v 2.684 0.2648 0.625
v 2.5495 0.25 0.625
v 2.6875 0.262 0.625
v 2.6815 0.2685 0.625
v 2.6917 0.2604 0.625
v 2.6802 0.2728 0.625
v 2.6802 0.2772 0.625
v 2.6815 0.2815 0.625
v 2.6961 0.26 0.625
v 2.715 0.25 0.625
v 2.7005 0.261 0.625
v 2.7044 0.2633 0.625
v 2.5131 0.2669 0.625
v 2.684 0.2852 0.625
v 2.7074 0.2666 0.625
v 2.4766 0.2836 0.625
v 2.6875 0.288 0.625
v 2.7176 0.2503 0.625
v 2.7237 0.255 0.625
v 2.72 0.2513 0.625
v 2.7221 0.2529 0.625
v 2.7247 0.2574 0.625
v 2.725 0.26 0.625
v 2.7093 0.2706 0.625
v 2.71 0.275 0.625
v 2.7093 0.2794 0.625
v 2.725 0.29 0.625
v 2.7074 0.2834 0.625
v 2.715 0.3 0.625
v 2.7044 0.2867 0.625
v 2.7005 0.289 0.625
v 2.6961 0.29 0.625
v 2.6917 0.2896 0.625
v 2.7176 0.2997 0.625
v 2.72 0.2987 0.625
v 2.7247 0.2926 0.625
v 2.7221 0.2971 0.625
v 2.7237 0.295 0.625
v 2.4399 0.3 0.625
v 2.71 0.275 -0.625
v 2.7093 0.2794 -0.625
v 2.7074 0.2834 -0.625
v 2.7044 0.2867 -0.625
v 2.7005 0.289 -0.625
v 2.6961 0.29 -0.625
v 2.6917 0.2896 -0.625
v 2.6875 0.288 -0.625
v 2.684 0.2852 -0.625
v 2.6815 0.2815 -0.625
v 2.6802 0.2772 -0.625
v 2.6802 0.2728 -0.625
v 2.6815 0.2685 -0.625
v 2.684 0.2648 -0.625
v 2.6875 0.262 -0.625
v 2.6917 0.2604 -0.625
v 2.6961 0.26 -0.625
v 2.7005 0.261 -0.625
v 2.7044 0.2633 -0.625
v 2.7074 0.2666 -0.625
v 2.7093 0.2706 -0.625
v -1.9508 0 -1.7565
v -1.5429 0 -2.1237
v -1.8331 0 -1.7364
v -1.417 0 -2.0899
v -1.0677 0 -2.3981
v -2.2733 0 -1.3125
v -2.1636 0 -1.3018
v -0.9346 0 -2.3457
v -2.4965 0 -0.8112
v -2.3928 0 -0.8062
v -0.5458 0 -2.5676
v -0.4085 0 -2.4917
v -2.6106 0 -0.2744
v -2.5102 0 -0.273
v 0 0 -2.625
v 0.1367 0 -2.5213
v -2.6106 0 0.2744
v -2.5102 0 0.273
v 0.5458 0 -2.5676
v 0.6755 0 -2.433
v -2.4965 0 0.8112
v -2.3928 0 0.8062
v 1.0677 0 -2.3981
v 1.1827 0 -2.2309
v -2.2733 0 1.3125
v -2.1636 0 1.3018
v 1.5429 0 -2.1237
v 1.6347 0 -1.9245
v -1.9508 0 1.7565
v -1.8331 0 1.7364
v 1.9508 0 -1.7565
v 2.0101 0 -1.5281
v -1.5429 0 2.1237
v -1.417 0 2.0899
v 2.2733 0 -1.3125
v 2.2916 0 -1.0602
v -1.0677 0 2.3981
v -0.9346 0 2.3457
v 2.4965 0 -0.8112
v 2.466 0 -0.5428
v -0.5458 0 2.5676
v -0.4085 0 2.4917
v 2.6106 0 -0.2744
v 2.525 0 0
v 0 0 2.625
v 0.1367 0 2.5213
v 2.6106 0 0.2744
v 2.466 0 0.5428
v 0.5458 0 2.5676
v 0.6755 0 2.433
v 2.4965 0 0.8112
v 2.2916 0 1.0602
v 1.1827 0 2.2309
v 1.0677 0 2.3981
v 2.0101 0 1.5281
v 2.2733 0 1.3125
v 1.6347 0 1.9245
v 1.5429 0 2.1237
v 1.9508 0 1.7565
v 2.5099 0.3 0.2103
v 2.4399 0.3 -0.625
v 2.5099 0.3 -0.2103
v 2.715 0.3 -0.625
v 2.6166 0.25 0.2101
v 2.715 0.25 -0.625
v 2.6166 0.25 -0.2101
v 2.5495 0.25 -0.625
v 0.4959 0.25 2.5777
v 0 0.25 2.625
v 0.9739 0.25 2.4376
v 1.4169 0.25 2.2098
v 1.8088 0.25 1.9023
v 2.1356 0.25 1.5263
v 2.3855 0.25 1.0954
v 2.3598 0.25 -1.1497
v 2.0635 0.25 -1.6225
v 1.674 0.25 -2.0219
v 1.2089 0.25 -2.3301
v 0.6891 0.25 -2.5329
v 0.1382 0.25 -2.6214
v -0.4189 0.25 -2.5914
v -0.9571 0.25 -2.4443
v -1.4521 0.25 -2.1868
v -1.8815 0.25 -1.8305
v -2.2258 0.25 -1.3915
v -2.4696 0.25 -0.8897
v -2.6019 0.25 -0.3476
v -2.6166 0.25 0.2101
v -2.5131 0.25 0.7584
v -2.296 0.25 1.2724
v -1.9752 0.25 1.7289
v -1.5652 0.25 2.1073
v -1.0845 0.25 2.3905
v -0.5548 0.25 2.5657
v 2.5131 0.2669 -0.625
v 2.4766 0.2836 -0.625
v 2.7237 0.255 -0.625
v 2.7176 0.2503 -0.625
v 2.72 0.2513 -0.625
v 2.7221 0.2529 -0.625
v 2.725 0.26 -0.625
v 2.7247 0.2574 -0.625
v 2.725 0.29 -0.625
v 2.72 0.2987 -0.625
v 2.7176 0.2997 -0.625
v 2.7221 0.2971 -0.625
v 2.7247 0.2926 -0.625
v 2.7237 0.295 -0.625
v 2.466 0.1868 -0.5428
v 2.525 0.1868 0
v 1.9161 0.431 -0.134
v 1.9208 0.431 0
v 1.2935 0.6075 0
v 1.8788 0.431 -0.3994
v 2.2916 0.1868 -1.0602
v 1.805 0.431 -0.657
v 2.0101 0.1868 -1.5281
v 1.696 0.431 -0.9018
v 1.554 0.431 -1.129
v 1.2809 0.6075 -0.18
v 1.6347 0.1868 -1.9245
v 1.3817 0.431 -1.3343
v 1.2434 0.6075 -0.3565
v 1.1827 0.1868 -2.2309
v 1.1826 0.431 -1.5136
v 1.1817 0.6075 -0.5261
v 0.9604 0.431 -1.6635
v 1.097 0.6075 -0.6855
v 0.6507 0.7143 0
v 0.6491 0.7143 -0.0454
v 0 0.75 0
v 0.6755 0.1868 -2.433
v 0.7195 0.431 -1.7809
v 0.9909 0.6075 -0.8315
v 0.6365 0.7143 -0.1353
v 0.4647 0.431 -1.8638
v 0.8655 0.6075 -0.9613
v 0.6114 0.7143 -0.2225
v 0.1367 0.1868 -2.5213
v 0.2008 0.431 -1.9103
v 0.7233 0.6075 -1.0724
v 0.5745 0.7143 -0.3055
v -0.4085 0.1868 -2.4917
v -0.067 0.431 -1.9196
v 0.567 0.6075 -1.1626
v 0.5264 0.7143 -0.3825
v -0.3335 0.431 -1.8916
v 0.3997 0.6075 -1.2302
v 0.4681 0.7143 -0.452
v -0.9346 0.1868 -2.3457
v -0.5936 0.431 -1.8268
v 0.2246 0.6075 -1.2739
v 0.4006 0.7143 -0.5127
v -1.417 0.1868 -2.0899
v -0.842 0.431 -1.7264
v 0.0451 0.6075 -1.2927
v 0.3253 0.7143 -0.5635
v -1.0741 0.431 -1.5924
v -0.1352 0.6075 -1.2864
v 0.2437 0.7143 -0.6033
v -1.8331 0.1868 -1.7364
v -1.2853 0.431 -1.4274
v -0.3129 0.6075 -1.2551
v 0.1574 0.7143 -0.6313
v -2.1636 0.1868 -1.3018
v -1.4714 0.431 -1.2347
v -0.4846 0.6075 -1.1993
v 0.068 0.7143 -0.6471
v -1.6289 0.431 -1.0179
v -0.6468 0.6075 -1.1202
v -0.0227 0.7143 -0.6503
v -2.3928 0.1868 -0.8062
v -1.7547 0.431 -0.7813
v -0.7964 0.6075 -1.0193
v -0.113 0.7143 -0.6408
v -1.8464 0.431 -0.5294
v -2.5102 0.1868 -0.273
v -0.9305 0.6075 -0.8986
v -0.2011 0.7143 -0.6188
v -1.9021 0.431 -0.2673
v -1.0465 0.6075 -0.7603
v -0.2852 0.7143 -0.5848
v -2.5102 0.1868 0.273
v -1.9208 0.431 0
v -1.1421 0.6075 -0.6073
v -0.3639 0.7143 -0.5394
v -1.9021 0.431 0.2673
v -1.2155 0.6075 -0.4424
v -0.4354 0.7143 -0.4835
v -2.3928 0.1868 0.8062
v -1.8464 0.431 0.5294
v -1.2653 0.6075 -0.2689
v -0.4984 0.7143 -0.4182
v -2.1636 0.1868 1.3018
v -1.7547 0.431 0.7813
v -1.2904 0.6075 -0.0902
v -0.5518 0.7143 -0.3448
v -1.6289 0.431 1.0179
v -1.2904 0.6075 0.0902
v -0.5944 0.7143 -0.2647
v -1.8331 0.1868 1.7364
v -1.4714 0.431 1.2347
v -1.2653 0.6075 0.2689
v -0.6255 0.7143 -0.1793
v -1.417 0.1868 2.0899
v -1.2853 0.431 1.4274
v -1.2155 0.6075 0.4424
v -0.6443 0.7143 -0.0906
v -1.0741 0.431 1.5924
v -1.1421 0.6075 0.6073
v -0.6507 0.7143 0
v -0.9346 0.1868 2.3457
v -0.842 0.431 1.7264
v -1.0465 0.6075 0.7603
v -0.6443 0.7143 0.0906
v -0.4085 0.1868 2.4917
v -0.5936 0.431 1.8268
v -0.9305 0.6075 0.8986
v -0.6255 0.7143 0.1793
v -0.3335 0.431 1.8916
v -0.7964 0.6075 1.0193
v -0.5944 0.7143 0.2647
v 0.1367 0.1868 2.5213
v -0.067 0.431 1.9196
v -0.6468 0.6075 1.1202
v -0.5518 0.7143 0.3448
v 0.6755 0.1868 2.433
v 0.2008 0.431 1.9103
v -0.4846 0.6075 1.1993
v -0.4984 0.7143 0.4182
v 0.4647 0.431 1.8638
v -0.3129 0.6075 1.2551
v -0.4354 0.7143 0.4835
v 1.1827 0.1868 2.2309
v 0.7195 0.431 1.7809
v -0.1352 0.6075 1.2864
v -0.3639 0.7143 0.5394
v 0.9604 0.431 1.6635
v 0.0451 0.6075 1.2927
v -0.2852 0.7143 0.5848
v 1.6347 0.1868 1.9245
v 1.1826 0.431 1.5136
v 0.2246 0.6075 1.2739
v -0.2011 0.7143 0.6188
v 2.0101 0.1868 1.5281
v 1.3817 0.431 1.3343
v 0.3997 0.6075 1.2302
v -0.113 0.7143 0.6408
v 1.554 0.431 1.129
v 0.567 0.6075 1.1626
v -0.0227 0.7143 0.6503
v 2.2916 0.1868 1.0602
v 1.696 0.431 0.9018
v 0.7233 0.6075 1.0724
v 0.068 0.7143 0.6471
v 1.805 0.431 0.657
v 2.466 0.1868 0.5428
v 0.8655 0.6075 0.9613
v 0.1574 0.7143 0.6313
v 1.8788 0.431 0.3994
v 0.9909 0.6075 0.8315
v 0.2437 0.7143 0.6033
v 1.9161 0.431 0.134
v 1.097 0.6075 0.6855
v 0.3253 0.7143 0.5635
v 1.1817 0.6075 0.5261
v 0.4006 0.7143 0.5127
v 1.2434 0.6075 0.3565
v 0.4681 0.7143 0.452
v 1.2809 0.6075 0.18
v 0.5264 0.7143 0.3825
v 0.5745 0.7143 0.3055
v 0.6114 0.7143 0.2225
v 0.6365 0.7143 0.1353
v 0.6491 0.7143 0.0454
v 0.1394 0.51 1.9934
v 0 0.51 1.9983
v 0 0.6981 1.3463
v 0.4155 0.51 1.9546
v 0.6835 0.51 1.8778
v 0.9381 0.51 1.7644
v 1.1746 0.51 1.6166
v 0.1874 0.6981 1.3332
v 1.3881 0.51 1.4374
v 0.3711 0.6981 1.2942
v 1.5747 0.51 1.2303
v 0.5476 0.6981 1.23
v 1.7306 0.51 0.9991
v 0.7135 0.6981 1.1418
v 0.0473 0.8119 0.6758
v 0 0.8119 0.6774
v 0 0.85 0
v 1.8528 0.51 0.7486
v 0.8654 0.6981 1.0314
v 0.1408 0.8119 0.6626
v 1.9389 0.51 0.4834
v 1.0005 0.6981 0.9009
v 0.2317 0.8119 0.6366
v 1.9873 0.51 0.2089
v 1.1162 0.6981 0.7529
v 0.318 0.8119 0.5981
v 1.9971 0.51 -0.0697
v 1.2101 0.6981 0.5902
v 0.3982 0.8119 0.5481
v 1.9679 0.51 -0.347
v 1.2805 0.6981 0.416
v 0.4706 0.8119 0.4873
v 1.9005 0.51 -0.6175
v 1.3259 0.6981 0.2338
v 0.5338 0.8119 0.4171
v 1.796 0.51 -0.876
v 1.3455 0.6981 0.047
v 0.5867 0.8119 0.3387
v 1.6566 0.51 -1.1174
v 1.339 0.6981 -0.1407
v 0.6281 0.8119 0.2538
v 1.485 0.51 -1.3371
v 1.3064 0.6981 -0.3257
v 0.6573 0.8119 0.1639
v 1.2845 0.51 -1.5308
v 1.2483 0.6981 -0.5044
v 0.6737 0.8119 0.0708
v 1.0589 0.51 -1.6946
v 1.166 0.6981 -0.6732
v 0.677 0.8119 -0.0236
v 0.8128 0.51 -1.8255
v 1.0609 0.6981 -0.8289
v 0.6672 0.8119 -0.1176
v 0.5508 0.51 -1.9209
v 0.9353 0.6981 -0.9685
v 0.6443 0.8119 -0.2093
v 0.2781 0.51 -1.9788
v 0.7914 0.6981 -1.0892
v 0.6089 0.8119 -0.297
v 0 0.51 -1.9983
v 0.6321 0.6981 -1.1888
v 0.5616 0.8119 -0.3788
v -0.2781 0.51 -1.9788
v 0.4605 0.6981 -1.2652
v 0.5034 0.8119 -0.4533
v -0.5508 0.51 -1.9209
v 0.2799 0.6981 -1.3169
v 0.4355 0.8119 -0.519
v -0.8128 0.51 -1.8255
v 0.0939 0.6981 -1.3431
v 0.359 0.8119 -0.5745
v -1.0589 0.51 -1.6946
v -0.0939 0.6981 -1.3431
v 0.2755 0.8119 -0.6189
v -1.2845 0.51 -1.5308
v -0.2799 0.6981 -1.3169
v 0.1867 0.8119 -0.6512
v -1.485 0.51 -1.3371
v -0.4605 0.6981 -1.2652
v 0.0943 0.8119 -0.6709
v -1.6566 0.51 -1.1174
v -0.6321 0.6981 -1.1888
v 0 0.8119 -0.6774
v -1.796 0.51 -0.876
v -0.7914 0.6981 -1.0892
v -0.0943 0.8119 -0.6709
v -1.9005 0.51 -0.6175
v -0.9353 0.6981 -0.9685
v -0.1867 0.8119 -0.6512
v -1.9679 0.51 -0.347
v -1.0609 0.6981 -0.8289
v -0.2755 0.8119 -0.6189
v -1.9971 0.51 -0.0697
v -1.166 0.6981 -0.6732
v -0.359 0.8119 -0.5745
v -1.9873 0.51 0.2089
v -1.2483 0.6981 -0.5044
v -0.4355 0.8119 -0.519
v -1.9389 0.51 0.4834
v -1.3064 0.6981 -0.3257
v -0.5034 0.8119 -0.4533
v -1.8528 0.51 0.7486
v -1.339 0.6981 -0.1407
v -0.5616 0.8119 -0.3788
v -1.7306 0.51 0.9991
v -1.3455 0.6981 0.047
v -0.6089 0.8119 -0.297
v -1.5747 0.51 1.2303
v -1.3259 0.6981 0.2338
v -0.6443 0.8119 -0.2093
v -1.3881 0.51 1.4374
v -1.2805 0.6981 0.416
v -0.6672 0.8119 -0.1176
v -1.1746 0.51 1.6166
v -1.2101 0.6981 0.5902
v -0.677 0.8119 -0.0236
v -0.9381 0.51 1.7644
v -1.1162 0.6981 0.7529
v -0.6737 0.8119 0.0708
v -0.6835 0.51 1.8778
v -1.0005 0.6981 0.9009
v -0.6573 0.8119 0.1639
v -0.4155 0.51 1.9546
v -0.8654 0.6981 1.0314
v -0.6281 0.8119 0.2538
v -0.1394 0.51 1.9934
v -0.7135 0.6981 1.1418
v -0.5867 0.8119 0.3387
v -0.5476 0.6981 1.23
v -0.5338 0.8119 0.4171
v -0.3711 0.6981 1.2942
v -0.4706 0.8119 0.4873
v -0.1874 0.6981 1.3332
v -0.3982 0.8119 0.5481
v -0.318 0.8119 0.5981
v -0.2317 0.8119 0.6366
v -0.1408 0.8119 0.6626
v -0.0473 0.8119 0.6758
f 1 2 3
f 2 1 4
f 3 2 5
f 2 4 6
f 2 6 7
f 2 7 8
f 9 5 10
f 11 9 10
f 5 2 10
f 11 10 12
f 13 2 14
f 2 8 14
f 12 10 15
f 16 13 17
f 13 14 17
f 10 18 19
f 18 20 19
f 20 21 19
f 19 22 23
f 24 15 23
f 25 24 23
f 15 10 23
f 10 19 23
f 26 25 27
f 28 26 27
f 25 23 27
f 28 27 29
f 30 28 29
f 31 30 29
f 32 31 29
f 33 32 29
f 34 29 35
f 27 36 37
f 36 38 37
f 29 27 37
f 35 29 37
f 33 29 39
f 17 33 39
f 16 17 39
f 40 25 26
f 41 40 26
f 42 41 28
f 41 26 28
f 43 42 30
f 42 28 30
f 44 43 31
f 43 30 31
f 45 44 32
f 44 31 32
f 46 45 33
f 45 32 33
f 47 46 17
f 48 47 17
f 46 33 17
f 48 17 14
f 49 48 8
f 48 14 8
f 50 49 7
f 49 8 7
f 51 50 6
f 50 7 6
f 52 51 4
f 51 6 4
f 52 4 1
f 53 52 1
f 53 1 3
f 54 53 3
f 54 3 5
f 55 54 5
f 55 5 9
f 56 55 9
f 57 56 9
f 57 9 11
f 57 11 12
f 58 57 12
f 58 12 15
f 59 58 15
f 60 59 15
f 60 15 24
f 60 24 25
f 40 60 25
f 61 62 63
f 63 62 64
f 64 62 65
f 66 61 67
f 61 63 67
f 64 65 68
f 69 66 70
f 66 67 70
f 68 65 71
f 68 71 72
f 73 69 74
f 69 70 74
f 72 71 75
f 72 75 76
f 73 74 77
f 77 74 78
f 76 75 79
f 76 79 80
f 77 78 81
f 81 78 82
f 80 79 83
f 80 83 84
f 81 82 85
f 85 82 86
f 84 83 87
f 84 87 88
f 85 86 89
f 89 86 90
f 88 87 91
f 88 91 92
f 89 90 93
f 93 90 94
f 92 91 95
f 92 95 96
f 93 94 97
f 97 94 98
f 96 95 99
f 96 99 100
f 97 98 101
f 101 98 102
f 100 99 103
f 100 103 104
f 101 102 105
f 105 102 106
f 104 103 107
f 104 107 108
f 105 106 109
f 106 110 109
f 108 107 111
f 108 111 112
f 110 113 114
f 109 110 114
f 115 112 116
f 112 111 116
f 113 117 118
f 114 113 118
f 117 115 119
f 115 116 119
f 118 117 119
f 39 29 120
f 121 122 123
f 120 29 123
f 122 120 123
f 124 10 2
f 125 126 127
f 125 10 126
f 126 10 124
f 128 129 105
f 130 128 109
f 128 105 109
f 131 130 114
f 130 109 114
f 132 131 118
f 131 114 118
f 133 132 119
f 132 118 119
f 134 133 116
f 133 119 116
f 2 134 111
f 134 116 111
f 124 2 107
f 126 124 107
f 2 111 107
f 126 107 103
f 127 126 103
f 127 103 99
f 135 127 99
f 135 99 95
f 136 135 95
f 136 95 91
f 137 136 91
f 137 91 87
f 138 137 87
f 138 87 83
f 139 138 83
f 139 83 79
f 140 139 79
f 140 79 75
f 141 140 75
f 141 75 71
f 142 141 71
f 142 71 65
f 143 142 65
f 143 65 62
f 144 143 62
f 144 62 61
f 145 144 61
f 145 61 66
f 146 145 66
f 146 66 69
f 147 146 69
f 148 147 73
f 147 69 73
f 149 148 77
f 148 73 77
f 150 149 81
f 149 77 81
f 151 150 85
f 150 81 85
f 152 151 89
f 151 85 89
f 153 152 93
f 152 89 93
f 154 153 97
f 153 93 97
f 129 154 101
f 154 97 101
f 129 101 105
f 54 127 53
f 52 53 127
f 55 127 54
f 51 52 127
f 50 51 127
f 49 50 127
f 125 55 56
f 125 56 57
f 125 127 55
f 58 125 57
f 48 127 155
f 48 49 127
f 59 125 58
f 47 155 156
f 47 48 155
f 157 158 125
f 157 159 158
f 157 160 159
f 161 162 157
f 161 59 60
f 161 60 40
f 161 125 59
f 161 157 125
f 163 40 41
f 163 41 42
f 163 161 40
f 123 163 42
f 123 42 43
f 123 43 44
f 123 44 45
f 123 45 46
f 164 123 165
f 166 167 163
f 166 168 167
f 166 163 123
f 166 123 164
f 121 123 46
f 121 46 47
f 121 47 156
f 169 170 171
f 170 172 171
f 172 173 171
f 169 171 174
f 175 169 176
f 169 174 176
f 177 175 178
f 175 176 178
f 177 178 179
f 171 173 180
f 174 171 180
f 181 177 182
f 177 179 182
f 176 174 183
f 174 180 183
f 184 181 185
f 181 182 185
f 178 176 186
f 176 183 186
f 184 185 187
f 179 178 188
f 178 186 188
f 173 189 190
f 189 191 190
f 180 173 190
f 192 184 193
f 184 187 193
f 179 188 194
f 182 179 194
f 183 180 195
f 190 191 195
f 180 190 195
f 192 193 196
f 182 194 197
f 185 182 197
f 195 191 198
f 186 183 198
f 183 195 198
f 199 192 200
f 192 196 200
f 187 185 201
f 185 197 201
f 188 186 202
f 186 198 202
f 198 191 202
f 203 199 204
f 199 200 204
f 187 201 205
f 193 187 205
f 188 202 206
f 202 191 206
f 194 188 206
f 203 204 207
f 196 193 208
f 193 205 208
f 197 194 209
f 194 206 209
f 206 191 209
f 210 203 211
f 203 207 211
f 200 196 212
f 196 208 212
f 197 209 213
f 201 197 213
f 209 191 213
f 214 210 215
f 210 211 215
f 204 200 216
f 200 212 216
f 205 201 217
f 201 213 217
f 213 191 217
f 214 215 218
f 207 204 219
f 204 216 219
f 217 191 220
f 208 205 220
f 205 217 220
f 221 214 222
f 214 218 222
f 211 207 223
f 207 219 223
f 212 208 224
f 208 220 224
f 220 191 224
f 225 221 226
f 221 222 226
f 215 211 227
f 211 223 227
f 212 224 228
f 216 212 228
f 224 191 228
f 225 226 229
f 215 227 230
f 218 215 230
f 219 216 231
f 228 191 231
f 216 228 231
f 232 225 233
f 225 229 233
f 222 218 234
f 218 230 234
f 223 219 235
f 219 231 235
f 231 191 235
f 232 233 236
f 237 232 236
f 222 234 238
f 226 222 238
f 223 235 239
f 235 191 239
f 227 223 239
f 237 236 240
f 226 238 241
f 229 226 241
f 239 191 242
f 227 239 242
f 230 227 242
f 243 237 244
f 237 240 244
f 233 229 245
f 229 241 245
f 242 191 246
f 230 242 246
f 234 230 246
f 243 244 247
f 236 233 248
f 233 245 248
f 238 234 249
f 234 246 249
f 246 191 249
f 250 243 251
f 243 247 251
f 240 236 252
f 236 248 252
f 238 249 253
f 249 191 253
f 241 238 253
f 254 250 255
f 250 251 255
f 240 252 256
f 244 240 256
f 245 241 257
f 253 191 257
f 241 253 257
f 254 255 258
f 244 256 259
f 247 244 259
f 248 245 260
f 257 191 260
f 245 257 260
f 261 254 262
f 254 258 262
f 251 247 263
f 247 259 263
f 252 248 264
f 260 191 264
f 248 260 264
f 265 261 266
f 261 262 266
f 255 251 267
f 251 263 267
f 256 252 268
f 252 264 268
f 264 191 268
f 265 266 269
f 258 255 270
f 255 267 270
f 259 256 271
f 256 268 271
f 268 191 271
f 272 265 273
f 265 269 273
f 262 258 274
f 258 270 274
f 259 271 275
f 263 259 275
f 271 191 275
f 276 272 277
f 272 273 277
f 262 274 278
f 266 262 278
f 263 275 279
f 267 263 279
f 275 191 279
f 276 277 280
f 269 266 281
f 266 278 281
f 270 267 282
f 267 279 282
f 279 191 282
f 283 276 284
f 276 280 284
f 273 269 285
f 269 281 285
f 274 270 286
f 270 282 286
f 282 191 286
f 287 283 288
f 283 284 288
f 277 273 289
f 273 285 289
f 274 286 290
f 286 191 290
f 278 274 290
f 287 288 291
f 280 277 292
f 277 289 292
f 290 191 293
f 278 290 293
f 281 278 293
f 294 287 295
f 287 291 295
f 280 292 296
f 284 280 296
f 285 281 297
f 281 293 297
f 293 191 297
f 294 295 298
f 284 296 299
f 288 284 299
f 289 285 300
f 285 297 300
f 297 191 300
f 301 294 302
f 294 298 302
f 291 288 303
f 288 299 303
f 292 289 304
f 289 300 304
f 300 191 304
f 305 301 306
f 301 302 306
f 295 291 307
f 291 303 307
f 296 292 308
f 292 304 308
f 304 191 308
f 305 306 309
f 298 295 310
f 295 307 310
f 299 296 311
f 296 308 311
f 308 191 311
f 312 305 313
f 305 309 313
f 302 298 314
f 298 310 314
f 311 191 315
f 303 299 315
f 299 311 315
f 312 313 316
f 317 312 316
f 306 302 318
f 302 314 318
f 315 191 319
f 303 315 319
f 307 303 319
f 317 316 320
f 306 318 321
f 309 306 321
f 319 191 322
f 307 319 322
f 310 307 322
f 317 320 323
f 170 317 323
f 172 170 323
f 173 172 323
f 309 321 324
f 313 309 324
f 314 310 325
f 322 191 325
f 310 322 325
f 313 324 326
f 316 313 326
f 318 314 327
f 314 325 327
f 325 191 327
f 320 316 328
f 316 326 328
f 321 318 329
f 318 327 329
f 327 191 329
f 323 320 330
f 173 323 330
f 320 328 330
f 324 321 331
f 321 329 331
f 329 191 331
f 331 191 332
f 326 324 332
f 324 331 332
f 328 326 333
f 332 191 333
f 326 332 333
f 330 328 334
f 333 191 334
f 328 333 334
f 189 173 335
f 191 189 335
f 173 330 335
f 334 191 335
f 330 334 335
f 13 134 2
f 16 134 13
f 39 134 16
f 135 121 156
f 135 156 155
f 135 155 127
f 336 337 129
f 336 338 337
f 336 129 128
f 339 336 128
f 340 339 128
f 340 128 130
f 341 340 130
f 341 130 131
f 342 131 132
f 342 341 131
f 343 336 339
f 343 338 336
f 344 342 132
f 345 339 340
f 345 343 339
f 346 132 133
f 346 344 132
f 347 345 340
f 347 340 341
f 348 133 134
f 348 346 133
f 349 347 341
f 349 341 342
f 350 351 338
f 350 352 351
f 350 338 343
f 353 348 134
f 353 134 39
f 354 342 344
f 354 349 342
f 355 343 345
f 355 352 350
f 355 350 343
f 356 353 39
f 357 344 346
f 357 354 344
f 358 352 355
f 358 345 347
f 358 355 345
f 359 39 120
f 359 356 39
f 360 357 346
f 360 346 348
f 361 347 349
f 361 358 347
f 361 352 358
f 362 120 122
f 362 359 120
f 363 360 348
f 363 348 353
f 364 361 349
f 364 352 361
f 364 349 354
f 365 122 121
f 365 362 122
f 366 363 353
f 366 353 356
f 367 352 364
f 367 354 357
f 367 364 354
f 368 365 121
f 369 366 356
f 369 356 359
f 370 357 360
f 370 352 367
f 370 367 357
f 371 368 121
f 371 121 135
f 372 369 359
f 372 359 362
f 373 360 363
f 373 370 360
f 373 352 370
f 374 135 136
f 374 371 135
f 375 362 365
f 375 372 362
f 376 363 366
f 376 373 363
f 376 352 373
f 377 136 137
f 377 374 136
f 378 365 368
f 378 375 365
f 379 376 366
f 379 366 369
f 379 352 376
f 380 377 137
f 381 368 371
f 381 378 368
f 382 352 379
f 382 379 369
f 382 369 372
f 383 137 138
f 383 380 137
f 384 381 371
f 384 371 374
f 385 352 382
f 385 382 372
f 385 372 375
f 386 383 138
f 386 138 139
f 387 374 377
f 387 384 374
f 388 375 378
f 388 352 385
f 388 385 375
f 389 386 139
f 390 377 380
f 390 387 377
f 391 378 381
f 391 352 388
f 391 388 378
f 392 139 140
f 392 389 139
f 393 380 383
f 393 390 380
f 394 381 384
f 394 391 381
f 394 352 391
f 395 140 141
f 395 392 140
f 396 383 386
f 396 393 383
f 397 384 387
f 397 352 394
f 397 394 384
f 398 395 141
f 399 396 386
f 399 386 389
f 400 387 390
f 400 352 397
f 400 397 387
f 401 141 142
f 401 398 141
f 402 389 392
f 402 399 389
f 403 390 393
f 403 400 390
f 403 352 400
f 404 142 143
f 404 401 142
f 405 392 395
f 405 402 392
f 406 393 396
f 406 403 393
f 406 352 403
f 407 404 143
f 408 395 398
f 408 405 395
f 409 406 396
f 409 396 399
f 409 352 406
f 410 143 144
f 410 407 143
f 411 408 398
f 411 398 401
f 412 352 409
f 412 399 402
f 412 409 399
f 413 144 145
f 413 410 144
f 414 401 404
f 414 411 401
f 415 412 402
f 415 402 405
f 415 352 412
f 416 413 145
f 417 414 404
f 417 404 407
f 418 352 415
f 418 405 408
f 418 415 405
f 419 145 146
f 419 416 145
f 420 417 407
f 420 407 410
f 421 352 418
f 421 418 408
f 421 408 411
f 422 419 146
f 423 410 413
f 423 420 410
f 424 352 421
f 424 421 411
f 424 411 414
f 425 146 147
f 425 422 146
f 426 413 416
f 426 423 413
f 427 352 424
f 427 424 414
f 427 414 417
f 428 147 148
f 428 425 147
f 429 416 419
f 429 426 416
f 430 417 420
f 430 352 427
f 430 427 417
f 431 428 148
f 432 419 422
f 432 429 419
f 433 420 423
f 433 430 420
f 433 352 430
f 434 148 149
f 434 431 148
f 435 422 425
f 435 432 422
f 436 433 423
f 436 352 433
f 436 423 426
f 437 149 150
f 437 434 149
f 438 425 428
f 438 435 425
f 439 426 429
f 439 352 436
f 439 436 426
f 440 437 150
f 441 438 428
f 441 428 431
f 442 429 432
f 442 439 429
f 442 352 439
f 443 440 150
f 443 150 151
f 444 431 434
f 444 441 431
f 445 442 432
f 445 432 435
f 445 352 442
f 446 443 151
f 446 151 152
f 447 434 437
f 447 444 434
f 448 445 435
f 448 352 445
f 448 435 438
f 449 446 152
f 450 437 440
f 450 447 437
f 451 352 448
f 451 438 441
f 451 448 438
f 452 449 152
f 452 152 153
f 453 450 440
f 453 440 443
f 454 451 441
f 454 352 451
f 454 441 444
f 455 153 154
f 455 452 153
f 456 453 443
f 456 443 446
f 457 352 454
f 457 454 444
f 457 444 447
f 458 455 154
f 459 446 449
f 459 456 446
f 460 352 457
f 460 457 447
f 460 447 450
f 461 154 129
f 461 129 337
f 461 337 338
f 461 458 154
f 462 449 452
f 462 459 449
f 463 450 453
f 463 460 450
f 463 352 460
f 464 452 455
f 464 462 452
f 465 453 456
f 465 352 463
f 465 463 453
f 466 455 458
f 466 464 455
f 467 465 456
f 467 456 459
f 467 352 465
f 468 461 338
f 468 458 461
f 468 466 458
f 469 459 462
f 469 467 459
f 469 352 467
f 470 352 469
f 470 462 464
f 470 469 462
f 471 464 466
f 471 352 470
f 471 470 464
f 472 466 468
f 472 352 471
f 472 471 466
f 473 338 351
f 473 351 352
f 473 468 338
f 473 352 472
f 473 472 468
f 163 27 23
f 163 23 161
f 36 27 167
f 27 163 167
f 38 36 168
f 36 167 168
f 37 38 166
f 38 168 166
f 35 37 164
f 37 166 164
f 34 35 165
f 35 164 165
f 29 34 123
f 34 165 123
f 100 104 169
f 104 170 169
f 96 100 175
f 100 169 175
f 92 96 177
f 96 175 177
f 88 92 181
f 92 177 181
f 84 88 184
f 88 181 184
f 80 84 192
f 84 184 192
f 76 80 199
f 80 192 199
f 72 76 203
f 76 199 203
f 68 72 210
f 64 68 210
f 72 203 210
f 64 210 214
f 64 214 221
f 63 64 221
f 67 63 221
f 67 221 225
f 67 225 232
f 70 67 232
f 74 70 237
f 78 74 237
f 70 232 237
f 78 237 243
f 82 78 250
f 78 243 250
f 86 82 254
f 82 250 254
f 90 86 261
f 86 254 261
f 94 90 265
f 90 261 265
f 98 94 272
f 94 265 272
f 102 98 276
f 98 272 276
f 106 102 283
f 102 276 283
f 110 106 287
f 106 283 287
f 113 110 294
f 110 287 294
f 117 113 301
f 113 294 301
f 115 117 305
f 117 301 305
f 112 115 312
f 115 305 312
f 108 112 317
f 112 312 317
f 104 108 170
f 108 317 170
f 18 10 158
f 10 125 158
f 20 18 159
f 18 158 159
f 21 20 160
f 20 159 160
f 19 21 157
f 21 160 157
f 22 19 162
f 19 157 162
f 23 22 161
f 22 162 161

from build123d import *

# Parameters (mm, degrees)
SKETCH1_R                       = 2.625
BOSS_EXTRUDE1_DEPTH             = 0.25
DOME1_FACE_RADIUS               = 2.625
DOME1_HEIGHT                    = 0.6
SKETCH2_W                       = 1.25
SKETCH2_H                       = 0.05
BOSS_EXTRUDE2_DEPTH             = 0.1
BOSS_EXTRUDE2_DIRECTION_2_REACH = 7.931
FILLET1_R                       = 0.01
CUT_EXTRUDE1_REACH              = 6.326
SKETCH3_R                       = 0.015


# Read off the part's stored shape, not the designer's step: Shell1
with BuildPart() as part:
    # Sketch1 → Boss-Extrude1 (new body)
    with BuildSketch(Plane(origin=(0, 0, 0), x_dir=(1, 0, 0), z_dir=(0, 1, 0))):
        with Locations(Location((0, 0, 0), (0, 0, 270))):
            Circle(SKETCH1_R)
    extrude(amount=BOSS_EXTRUDE1_DEPTH)

    # Dome1: a dome of height H over a round flat face of radius A is a cap of a sphere of radius (A * A + H * H) / (2 * H)
    dome1_r = (DOME1_FACE_RADIUS * DOME1_FACE_RADIUS + DOME1_HEIGHT * DOME1_HEIGHT) / (2 * DOME1_HEIGHT)
    dome1_base = Plane((0, 0.25, 0), z_dir=(0, 1, 0))
    with Locations(dome1_base.offset(DOME1_HEIGHT - dome1_r)):
        dome1_ball = Sphere(dome1_r, mode=Mode.PRIVATE)
    add(split(dome1_ball, bisect_by=dome1_base, keep=Keep.TOP, mode=Mode.PRIVATE))

    # Shell1 outline → Shell1 (revolve, cut)
    with BuildSketch(Plane.XY):
        with BuildLine():
            Line((2.525, 0), (2.525000005, 0.186842827))
            ThreePointArc((2.525000005, 0.186842827), (1.293519523, 0.607502106), (0, 0.75))
            Line((0, 0.75), (0, 0))
            Line((0, 0), (2.525, 0))
        make_face()
    revolve(axis=Axis((0, 0, 0), (0, 1, 0)), mode=Mode.SUBTRACT)

    # Sketch2 → Boss-Extrude2 (add)
    with BuildSketch(Plane(origin=(2.625, 0, 0), x_dir=(0, 0, -1), z_dir=(1, 0, 0))):
        with Locations((0, 0.275)):
            Rectangle(SKETCH2_W, SKETCH2_H)
    extrude(amount=BOSS_EXTRUDE2_DEPTH)

    # Sketch2 → Boss-Extrude2 direction 2 (add, up to next)
    with BuildSketch(Plane(origin=(2.625, 0, 0), x_dir=(0, 0, -1), z_dir=(1, 0, 0)), mode=Mode.PRIVATE) as boss_extrude2_direction_2_sk1:
        with Locations((0, 0.275)):
            Rectangle(SKETCH2_W, SKETCH2_H)
    boss_extrude2_direction_2_tool1 = extrude(boss_extrude2_direction_2_sk1.sketch, amount=-BOSS_EXTRUDE2_DIRECTION_2_REACH, mode=Mode.PRIVATE) - part.part
    add(boss_extrude2_direction_2_tool1.solids().sort_by_distance((2.625, 0.275, 0))[0])

    # Fillet1
    fillet1_edges = [part.edges().sort_by_distance(p)[0] for p in [
        (2.725, 0.25, 0),
        (2.725, 0.3, 0),
    ]]
    fillet(fillet1_edges, radius=FILLET1_R)

    # Sketch3 → Cut-Extrude1 (cut, up to next)
    with BuildSketch(Plane.XY.offset(0.625), mode=Mode.PRIVATE) as cut_extrude1_sk1:
        with Locations((2.695, 0.275)):
            Circle(SKETCH3_R)
    cut_extrude1_tool1 = extrude(cut_extrude1_sk1.sketch, amount=-CUT_EXTRUDE1_REACH, mode=Mode.PRIVATE) & part.part
    add(cut_extrude1_tool1.solids().sort_by_distance((2.695, 0.275, 0.625))[0], mode=Mode.SUBTRACT)


solid = part.part
